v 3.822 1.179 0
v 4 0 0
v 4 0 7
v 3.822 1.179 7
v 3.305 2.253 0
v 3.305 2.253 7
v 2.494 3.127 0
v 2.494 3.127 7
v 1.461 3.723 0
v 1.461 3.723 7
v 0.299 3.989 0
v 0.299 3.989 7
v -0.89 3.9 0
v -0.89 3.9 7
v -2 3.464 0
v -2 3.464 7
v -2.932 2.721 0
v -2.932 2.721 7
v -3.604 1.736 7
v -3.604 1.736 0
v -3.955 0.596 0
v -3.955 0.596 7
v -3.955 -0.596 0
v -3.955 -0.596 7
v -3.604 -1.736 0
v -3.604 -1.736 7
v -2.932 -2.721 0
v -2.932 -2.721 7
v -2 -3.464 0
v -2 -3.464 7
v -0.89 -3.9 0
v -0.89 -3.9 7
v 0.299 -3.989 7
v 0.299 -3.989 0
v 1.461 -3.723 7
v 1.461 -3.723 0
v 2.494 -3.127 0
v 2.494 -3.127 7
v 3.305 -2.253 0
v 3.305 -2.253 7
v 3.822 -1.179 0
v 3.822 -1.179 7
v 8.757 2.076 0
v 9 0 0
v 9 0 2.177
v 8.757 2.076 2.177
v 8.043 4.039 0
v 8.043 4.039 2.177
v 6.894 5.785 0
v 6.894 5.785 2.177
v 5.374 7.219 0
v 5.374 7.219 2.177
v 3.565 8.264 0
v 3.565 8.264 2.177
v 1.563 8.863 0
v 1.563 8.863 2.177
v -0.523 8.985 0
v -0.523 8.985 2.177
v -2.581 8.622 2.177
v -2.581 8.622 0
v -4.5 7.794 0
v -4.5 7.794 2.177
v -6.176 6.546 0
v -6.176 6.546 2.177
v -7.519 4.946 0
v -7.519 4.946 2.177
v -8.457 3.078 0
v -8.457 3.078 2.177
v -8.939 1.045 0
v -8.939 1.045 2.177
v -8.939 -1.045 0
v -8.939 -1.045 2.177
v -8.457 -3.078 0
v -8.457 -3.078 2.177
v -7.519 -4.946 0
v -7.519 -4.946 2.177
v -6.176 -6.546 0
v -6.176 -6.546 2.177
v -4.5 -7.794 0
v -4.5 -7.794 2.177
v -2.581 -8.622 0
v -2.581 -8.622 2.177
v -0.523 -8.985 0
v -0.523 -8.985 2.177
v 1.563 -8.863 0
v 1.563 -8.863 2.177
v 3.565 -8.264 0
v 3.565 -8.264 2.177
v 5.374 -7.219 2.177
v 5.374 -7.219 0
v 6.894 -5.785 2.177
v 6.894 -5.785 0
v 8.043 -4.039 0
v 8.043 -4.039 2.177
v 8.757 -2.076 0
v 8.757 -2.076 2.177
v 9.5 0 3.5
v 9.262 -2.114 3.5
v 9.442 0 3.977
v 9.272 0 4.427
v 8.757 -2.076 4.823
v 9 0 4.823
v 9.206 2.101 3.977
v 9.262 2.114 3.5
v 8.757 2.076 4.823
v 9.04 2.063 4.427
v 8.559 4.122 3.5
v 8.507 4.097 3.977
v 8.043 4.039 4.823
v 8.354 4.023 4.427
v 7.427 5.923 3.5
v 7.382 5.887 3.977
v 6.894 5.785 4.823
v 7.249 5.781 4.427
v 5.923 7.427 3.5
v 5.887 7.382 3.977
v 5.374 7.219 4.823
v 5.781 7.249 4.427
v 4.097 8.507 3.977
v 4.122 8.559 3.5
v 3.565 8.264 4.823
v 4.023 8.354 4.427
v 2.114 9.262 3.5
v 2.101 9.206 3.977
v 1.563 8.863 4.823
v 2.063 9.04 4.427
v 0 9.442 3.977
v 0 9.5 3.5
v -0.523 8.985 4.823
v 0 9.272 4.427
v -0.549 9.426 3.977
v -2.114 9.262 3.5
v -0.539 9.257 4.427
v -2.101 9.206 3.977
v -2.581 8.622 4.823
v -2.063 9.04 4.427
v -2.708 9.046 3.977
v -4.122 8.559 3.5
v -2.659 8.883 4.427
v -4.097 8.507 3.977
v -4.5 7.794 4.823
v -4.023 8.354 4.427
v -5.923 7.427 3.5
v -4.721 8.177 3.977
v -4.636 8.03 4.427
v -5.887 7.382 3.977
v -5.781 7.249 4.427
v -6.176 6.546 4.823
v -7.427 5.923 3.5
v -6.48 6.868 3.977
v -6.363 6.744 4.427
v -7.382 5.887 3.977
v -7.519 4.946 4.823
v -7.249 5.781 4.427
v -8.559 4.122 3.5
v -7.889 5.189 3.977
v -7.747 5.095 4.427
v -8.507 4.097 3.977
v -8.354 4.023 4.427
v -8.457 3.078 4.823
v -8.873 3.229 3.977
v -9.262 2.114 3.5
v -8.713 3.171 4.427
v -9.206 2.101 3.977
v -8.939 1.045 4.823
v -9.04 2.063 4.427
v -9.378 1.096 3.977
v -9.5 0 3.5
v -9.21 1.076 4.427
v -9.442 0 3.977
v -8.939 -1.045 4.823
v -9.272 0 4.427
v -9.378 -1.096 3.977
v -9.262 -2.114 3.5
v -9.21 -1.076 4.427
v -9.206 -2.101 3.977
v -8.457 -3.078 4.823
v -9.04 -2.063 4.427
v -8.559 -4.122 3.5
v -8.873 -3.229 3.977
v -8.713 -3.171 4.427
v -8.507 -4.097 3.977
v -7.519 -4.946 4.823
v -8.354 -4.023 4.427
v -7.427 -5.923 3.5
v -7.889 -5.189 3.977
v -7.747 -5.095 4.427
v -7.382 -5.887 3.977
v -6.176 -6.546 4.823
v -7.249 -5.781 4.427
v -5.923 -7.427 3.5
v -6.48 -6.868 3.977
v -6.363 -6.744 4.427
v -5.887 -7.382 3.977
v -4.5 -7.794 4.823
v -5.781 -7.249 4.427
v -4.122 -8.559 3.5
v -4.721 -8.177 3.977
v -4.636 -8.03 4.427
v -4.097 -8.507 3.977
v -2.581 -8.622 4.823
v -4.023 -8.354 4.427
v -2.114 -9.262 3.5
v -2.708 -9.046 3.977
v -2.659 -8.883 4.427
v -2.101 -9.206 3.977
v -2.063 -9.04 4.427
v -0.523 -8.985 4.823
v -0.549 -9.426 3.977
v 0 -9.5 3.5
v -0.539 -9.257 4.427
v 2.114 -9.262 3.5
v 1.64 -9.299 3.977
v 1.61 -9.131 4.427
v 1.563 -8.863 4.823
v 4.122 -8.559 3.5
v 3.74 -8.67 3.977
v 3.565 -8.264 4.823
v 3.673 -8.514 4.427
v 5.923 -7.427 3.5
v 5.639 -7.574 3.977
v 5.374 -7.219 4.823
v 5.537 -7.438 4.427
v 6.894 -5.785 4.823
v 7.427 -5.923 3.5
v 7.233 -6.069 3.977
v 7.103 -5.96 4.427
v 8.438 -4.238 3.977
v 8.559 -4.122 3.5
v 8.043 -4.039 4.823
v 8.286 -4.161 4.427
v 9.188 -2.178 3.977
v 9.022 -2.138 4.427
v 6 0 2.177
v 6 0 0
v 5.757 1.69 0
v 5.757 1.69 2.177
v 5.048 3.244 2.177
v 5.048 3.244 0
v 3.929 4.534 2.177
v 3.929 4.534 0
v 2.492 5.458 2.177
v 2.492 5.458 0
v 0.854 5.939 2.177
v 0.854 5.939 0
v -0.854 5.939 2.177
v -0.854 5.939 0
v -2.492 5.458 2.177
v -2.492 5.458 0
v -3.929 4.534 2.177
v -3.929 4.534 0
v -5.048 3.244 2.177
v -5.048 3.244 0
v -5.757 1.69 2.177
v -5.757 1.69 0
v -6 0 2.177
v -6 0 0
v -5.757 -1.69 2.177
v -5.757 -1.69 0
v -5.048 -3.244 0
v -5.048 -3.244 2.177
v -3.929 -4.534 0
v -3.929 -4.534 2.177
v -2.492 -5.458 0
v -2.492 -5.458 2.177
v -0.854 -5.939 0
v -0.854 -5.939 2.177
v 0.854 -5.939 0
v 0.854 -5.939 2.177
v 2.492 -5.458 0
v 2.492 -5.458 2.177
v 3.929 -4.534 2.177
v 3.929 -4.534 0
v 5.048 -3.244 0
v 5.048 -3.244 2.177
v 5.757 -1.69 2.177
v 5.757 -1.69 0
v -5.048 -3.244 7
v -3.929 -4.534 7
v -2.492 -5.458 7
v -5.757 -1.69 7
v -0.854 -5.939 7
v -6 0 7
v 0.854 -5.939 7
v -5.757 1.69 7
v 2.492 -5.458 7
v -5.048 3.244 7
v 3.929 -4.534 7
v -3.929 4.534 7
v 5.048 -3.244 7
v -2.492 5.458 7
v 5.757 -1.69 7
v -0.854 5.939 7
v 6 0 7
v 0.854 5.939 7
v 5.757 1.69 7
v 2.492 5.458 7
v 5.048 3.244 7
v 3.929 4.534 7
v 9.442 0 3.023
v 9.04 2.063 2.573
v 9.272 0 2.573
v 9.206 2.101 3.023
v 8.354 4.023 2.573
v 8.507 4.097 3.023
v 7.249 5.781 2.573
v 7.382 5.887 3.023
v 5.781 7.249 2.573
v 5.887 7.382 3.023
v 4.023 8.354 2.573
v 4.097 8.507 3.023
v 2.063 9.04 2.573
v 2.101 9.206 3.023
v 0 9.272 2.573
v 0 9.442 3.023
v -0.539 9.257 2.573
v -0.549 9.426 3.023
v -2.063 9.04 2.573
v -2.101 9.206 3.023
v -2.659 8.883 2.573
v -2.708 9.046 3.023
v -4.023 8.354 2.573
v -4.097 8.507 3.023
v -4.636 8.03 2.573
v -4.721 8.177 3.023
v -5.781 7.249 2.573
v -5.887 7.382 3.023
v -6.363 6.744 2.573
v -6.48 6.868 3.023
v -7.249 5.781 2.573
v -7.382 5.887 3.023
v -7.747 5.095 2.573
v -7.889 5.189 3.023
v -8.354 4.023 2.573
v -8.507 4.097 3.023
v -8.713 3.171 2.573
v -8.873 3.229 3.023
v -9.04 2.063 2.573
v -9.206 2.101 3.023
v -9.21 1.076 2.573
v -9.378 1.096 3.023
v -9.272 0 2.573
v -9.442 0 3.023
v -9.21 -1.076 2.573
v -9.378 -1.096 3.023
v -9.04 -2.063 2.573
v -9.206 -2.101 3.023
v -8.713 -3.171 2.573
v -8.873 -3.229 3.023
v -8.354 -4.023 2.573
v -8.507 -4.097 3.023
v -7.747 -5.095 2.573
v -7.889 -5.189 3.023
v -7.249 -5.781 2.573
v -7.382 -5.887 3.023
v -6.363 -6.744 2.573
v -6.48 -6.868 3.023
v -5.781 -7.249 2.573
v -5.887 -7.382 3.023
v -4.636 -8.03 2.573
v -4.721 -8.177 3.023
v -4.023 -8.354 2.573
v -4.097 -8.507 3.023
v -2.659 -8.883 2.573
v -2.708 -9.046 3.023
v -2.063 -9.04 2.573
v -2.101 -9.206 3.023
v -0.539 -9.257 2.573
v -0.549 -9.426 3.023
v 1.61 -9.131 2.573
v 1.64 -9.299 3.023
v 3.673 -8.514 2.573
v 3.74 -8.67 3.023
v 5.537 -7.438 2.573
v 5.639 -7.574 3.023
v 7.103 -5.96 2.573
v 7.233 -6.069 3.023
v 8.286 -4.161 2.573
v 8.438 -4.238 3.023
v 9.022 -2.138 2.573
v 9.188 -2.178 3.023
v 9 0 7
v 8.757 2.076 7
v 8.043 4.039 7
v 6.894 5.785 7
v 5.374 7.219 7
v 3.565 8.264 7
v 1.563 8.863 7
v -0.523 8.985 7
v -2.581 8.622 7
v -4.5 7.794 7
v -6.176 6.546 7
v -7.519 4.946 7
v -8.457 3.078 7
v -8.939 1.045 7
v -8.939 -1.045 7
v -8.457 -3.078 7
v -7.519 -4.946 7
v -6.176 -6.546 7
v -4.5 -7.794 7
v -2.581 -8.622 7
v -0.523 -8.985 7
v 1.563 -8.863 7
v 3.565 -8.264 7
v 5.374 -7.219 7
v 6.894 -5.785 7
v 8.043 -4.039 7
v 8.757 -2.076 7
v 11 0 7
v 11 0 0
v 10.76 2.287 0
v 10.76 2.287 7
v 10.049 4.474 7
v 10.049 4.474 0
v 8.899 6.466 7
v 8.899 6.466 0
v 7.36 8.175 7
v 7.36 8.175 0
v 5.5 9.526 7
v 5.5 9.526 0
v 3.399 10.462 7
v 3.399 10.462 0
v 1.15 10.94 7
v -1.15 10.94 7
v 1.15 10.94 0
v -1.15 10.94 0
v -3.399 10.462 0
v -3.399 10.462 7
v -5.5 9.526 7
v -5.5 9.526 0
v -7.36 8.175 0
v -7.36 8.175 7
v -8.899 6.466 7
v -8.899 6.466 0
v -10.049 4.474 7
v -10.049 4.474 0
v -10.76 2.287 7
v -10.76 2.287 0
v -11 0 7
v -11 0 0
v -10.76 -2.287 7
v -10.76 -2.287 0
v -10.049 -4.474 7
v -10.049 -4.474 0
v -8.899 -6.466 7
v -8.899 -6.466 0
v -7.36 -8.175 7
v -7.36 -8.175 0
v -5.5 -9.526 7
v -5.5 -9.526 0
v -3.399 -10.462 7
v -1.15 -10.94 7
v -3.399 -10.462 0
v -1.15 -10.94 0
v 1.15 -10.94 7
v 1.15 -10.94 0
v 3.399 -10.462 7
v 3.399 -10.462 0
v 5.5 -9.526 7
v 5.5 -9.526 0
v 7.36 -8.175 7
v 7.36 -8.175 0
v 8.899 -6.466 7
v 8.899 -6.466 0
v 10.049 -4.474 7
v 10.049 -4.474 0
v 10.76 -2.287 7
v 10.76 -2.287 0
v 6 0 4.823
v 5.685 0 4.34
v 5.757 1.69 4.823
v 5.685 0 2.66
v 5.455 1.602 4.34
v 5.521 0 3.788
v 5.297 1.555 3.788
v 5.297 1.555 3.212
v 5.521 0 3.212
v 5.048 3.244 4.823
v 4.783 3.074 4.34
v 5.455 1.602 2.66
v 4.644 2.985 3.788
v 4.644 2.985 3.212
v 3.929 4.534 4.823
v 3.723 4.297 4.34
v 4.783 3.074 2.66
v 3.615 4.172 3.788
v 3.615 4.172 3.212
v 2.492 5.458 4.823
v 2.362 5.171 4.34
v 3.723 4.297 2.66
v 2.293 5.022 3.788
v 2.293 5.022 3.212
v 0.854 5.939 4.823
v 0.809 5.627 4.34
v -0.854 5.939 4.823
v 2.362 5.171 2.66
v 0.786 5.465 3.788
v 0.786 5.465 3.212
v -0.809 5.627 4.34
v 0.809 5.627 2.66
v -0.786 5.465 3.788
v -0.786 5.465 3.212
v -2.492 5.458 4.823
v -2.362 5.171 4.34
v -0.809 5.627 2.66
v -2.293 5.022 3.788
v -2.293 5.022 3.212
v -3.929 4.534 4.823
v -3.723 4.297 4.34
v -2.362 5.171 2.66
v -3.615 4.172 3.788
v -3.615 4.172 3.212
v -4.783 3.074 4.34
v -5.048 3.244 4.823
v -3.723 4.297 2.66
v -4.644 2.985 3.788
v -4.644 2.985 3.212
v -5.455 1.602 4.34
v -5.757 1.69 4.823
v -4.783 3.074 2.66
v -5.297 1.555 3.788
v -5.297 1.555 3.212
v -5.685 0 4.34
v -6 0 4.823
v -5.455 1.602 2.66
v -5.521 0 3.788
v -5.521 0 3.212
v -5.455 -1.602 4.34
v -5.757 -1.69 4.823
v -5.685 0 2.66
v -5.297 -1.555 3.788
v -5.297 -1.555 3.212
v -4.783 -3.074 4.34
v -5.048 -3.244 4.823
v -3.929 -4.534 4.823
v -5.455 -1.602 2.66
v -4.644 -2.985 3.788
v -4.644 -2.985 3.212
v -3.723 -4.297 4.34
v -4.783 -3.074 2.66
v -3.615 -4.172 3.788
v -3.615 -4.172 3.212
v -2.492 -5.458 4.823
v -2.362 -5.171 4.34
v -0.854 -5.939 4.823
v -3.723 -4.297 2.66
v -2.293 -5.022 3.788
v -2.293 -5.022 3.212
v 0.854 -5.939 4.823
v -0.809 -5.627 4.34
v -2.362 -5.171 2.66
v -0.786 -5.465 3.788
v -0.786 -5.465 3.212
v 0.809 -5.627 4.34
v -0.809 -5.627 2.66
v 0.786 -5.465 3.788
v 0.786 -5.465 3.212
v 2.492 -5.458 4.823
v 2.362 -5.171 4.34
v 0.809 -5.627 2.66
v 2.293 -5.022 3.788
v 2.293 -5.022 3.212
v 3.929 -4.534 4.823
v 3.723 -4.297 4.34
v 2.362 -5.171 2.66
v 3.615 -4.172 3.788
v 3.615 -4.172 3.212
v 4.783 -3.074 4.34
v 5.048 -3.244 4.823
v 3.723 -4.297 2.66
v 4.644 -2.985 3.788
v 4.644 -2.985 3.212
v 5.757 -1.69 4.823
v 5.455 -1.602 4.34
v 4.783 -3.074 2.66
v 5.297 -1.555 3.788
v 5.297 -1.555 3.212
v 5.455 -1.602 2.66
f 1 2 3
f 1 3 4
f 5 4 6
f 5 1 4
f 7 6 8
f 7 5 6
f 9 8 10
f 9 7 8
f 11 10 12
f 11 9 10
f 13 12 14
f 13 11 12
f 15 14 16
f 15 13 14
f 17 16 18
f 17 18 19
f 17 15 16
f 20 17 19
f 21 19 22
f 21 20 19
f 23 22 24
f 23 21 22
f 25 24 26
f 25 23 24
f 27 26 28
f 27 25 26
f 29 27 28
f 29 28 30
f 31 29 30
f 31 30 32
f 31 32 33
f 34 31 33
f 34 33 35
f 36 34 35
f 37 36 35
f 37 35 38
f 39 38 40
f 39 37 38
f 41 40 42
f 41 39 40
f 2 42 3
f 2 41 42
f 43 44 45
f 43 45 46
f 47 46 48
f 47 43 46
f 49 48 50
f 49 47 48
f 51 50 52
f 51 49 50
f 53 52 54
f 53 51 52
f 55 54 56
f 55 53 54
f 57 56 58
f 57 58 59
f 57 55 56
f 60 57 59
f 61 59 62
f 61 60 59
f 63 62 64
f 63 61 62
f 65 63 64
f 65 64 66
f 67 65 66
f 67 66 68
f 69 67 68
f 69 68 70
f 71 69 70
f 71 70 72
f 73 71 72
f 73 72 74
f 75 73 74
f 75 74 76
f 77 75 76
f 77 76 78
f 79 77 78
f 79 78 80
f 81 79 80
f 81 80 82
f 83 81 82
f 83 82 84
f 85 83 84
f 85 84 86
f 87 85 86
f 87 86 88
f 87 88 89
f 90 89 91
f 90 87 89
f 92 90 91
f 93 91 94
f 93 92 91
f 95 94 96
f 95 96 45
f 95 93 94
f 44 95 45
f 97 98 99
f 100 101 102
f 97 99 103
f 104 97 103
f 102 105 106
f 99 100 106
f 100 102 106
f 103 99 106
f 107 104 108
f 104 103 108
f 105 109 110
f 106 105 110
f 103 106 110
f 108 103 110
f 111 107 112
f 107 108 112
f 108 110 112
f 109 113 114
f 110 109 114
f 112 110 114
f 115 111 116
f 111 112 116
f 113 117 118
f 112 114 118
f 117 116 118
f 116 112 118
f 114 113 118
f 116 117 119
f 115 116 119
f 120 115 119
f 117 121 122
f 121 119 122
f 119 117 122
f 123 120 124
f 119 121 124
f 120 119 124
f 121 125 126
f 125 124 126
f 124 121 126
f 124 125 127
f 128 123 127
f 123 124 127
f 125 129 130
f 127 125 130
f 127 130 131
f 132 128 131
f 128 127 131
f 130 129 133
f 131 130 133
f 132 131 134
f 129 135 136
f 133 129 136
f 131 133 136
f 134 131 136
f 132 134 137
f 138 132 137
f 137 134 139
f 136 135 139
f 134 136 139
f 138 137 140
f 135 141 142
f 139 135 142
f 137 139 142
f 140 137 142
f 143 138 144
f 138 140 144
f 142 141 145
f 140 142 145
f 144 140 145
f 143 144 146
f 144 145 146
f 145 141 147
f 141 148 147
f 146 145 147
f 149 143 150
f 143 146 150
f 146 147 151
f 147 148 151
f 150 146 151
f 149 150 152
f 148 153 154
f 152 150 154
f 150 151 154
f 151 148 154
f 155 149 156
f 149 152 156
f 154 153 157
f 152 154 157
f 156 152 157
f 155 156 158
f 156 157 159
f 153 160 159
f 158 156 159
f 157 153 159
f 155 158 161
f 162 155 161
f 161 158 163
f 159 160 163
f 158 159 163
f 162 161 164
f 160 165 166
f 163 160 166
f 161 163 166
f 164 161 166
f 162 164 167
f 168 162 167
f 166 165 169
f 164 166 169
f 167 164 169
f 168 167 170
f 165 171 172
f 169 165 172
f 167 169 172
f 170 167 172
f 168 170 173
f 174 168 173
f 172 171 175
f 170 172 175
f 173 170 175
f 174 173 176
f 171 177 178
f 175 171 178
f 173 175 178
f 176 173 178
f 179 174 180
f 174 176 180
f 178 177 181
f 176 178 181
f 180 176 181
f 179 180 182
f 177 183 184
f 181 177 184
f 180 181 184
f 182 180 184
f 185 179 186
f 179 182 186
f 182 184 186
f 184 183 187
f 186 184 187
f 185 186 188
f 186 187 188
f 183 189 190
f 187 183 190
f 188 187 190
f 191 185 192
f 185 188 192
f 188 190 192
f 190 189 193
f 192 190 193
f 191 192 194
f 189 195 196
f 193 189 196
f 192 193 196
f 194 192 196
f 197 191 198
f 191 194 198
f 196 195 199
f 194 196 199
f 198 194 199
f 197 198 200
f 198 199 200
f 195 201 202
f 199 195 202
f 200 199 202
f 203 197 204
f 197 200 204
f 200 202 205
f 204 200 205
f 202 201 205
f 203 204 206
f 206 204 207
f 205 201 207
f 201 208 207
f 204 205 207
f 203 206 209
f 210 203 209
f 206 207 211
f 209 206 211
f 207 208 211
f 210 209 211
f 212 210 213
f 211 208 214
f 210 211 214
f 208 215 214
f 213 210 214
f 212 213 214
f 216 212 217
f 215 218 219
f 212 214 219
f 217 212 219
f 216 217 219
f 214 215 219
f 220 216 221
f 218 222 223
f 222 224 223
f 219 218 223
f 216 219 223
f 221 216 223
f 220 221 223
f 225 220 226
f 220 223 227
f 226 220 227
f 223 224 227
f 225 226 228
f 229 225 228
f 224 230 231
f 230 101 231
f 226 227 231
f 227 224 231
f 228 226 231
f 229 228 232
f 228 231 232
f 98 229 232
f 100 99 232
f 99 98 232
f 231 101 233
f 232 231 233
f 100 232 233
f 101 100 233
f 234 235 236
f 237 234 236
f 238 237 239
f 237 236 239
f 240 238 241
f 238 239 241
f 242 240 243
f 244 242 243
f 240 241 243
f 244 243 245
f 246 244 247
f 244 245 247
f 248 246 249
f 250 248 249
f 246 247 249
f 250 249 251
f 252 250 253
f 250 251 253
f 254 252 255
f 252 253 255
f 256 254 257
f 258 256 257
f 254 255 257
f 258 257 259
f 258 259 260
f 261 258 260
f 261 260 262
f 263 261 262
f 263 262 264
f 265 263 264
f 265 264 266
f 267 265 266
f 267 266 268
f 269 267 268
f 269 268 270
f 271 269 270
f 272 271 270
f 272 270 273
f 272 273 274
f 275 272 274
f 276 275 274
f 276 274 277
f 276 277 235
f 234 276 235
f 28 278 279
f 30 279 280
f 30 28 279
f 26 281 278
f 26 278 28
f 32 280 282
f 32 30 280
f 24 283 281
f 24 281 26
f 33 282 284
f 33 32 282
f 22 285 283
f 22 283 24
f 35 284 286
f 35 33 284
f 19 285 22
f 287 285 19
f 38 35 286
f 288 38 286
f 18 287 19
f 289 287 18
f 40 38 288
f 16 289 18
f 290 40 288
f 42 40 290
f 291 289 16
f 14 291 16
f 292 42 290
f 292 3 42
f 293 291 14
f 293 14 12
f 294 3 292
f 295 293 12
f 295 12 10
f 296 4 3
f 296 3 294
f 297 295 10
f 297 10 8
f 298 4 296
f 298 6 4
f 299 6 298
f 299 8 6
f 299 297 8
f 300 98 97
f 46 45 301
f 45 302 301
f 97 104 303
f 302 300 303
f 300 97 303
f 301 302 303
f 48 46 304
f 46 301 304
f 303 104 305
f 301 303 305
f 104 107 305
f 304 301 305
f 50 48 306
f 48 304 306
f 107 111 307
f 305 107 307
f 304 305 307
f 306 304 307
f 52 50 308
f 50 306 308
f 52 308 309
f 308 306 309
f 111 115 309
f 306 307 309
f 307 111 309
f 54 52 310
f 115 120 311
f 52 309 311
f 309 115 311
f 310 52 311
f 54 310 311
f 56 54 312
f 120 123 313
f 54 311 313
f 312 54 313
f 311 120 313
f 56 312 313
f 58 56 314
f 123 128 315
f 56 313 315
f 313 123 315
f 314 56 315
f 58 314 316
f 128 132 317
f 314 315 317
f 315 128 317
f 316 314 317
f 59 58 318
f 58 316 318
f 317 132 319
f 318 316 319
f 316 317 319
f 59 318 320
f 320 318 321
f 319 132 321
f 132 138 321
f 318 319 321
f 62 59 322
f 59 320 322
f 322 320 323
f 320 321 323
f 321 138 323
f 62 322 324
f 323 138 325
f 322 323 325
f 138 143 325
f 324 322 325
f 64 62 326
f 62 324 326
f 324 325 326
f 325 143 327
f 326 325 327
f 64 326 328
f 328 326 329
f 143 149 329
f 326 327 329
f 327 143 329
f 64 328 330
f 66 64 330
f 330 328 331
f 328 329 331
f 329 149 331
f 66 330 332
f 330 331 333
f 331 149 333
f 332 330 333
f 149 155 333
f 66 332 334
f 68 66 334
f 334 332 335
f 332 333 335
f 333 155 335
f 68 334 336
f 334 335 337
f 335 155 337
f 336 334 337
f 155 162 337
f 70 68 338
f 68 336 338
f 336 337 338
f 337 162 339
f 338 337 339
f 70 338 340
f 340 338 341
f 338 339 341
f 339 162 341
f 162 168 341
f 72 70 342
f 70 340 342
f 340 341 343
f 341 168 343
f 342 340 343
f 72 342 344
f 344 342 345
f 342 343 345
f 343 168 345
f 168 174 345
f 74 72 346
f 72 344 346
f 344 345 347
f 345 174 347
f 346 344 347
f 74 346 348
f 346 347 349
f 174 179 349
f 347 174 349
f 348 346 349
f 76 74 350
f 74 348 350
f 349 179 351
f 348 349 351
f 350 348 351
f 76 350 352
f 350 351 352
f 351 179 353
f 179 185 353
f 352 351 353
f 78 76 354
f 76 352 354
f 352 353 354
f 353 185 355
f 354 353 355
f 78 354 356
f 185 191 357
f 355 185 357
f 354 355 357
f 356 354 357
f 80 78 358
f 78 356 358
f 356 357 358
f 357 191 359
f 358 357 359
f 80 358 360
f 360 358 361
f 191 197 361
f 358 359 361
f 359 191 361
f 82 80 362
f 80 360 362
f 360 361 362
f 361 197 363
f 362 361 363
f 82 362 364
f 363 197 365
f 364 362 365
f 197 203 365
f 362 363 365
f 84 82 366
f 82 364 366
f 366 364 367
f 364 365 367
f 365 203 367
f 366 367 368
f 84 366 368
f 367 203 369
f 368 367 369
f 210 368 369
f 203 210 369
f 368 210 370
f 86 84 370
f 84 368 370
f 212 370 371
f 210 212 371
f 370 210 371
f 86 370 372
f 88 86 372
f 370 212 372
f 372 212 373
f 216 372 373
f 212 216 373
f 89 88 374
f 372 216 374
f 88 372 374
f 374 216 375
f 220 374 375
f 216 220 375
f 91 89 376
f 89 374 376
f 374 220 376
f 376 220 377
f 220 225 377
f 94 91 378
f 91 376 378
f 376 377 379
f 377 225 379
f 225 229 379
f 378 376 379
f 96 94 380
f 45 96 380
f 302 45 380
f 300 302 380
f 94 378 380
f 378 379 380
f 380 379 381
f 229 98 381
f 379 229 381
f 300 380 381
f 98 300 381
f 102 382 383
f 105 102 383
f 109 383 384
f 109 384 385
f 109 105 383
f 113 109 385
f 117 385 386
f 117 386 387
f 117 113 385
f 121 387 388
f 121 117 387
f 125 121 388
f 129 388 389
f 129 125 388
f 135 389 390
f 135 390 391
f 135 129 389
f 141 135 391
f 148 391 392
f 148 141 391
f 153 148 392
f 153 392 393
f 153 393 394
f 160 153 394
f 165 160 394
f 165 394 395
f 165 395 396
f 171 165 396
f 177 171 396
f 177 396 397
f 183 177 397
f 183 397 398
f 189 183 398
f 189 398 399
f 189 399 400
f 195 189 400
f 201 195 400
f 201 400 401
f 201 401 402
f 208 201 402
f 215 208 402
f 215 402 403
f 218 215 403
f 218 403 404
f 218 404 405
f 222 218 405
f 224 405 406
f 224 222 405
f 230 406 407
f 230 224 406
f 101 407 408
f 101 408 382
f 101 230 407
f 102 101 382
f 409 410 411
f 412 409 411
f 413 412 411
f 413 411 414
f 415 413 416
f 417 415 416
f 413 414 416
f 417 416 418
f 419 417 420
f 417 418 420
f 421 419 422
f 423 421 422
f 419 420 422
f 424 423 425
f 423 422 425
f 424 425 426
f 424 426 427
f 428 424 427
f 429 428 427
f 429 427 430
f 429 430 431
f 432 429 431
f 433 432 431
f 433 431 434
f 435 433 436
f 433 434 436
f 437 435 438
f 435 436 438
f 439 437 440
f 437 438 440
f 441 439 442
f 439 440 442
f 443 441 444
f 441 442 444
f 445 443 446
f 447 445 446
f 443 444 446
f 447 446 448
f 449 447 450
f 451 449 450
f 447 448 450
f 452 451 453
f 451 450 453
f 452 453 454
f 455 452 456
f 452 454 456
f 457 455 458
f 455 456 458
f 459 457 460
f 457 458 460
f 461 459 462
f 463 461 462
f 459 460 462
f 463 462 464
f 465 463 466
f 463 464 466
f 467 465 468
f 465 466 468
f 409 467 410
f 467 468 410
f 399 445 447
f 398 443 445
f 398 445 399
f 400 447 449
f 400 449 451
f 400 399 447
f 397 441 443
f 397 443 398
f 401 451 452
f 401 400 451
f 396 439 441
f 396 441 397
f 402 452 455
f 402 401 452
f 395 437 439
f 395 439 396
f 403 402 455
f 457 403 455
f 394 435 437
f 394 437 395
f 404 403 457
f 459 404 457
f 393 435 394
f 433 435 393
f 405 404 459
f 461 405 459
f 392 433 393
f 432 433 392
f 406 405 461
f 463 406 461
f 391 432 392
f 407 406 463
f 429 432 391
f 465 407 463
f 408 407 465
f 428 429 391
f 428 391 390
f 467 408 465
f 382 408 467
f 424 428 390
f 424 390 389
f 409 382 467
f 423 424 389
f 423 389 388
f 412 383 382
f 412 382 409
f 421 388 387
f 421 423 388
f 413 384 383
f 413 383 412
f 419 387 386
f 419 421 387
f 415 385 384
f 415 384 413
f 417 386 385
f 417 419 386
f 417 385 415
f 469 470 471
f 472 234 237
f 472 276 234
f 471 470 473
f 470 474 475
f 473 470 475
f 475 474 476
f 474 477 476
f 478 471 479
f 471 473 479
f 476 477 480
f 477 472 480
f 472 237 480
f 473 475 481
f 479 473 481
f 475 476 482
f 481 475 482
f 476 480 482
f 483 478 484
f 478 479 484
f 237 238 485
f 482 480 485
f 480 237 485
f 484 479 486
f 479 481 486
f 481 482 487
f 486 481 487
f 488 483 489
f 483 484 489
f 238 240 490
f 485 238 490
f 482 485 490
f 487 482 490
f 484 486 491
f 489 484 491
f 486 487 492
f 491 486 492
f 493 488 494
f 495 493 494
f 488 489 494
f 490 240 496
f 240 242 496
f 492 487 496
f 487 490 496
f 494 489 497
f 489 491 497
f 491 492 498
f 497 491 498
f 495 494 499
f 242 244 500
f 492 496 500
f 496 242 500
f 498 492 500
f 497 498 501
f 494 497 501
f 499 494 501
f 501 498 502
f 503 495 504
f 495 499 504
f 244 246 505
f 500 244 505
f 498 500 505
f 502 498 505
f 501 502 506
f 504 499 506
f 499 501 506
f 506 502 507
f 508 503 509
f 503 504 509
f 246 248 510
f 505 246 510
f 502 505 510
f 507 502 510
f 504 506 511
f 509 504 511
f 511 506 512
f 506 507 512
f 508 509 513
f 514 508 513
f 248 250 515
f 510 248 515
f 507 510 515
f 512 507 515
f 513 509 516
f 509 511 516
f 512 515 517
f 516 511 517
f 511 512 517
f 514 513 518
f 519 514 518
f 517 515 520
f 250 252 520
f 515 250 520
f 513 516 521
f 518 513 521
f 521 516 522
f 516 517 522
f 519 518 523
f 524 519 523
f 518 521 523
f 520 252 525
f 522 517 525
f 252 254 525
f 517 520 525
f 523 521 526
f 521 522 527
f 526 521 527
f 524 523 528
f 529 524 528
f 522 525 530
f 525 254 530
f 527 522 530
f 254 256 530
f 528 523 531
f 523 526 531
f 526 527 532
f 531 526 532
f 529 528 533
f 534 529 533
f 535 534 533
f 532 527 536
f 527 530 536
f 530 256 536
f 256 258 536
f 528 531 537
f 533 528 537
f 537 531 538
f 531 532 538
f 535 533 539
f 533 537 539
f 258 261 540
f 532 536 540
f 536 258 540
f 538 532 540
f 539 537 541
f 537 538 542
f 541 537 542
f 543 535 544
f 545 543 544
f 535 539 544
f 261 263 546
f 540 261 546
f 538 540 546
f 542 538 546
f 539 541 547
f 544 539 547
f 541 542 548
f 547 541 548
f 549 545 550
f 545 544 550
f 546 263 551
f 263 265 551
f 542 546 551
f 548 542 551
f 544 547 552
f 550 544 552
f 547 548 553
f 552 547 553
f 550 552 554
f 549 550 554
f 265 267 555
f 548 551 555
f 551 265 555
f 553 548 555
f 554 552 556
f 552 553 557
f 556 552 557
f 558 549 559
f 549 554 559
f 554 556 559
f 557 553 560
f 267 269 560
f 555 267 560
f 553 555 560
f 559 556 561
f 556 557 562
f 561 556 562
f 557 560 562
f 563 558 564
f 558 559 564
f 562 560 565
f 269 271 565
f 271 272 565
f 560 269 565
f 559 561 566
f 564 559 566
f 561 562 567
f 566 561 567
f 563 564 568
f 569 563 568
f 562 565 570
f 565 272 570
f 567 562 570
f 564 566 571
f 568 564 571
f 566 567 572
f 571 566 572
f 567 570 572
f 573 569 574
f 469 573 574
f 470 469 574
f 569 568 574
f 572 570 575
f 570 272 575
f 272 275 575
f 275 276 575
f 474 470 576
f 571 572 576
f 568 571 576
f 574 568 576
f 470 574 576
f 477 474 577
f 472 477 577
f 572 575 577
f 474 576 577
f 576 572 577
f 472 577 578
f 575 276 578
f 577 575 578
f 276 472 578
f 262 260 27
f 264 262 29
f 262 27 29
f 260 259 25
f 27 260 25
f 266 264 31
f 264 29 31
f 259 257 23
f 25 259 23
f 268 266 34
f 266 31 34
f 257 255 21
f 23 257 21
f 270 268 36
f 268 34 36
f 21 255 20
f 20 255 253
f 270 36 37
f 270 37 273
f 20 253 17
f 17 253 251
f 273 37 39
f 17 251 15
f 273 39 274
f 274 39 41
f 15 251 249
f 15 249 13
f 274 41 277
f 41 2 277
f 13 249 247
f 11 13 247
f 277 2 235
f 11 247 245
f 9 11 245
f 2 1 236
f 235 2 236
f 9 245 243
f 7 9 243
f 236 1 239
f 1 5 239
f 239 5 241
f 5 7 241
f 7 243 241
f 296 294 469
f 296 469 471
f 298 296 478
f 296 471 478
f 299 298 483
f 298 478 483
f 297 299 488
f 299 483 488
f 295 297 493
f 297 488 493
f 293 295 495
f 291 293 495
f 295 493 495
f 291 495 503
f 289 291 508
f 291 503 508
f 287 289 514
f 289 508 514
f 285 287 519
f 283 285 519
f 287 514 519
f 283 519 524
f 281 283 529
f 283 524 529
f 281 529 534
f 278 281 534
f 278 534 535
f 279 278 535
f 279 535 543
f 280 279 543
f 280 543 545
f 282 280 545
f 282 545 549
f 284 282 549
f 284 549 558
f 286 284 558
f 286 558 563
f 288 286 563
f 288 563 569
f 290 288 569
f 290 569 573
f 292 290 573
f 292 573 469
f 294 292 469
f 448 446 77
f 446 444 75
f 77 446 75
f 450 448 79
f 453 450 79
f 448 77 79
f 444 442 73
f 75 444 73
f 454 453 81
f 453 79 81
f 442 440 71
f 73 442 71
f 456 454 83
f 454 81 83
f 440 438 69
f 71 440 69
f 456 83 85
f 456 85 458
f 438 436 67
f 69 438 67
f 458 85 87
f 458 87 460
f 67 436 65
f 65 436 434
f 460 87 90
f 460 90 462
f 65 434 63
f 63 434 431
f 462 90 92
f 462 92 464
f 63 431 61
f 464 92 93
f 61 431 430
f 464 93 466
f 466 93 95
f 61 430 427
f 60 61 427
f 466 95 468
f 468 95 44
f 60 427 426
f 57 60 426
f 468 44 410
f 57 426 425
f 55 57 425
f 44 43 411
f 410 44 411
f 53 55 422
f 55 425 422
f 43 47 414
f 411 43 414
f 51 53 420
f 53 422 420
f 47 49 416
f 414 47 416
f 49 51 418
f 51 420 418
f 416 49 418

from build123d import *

# Parameters (mm, degrees)
TORUS_R           = 2
CYLINDER003_R     = 6
CYLINDER003_DEPTH = 7
CYLINDER002_R     = 9
CYLINDER002_DEPTH = 7
CYLINDER001_R     = 4
CYLINDER001_DEPTH = 7
CYLINDER_R        = 11
CYLINDER_DEPTH    = 7


with BuildPart() as torus:
    # Torus → Torus (revolve)
    with BuildSketch(Plane(origin=(0, 0, 3.5), x_dir=(1, 0, 0), z_dir=(0, -1, 0))):
        with Locations((7.5, 0)):
            Circle(TORUS_R)
    revolve(axis=Axis((0, 0, 3.5), (0, 0, 1)))


with BuildPart() as cylinder003:
    # Cylinder003 → Cylinder003 (new body)
    with BuildSketch(Plane.XY):
        Circle(CYLINDER003_R)
    extrude(amount=CYLINDER003_DEPTH)


with BuildPart() as cut005:
    # Cylinder002 → Cylinder002 (new body)
    with BuildSketch(Plane.XY):
        Circle(CYLINDER002_R)
    extrude(amount=CYLINDER002_DEPTH)

    # Cut005: cut Cylinder003
    add(cylinder003.part, mode=Mode.SUBTRACT)


with BuildPart() as cylinder001:
    # Cylinder001 → Cylinder001 (new body)
    with BuildSketch(Plane.XY):
        Circle(CYLINDER001_R)
    extrude(amount=CYLINDER001_DEPTH)


with BuildPart() as cut007:
    # Cylinder → Cylinder (new body)
    with BuildSketch(Plane.XY):
        Circle(CYLINDER_R)
    extrude(amount=CYLINDER_DEPTH)

    # Cut004: cut Cylinder001
    add(cylinder001.part, mode=Mode.SUBTRACT)

    # Cut006: cut Cut005
    add(cut005.part, mode=Mode.SUBTRACT)

    # Cut007: cut Torus
    add(torus.part, mode=Mode.SUBTRACT)


solid = cut007.part
